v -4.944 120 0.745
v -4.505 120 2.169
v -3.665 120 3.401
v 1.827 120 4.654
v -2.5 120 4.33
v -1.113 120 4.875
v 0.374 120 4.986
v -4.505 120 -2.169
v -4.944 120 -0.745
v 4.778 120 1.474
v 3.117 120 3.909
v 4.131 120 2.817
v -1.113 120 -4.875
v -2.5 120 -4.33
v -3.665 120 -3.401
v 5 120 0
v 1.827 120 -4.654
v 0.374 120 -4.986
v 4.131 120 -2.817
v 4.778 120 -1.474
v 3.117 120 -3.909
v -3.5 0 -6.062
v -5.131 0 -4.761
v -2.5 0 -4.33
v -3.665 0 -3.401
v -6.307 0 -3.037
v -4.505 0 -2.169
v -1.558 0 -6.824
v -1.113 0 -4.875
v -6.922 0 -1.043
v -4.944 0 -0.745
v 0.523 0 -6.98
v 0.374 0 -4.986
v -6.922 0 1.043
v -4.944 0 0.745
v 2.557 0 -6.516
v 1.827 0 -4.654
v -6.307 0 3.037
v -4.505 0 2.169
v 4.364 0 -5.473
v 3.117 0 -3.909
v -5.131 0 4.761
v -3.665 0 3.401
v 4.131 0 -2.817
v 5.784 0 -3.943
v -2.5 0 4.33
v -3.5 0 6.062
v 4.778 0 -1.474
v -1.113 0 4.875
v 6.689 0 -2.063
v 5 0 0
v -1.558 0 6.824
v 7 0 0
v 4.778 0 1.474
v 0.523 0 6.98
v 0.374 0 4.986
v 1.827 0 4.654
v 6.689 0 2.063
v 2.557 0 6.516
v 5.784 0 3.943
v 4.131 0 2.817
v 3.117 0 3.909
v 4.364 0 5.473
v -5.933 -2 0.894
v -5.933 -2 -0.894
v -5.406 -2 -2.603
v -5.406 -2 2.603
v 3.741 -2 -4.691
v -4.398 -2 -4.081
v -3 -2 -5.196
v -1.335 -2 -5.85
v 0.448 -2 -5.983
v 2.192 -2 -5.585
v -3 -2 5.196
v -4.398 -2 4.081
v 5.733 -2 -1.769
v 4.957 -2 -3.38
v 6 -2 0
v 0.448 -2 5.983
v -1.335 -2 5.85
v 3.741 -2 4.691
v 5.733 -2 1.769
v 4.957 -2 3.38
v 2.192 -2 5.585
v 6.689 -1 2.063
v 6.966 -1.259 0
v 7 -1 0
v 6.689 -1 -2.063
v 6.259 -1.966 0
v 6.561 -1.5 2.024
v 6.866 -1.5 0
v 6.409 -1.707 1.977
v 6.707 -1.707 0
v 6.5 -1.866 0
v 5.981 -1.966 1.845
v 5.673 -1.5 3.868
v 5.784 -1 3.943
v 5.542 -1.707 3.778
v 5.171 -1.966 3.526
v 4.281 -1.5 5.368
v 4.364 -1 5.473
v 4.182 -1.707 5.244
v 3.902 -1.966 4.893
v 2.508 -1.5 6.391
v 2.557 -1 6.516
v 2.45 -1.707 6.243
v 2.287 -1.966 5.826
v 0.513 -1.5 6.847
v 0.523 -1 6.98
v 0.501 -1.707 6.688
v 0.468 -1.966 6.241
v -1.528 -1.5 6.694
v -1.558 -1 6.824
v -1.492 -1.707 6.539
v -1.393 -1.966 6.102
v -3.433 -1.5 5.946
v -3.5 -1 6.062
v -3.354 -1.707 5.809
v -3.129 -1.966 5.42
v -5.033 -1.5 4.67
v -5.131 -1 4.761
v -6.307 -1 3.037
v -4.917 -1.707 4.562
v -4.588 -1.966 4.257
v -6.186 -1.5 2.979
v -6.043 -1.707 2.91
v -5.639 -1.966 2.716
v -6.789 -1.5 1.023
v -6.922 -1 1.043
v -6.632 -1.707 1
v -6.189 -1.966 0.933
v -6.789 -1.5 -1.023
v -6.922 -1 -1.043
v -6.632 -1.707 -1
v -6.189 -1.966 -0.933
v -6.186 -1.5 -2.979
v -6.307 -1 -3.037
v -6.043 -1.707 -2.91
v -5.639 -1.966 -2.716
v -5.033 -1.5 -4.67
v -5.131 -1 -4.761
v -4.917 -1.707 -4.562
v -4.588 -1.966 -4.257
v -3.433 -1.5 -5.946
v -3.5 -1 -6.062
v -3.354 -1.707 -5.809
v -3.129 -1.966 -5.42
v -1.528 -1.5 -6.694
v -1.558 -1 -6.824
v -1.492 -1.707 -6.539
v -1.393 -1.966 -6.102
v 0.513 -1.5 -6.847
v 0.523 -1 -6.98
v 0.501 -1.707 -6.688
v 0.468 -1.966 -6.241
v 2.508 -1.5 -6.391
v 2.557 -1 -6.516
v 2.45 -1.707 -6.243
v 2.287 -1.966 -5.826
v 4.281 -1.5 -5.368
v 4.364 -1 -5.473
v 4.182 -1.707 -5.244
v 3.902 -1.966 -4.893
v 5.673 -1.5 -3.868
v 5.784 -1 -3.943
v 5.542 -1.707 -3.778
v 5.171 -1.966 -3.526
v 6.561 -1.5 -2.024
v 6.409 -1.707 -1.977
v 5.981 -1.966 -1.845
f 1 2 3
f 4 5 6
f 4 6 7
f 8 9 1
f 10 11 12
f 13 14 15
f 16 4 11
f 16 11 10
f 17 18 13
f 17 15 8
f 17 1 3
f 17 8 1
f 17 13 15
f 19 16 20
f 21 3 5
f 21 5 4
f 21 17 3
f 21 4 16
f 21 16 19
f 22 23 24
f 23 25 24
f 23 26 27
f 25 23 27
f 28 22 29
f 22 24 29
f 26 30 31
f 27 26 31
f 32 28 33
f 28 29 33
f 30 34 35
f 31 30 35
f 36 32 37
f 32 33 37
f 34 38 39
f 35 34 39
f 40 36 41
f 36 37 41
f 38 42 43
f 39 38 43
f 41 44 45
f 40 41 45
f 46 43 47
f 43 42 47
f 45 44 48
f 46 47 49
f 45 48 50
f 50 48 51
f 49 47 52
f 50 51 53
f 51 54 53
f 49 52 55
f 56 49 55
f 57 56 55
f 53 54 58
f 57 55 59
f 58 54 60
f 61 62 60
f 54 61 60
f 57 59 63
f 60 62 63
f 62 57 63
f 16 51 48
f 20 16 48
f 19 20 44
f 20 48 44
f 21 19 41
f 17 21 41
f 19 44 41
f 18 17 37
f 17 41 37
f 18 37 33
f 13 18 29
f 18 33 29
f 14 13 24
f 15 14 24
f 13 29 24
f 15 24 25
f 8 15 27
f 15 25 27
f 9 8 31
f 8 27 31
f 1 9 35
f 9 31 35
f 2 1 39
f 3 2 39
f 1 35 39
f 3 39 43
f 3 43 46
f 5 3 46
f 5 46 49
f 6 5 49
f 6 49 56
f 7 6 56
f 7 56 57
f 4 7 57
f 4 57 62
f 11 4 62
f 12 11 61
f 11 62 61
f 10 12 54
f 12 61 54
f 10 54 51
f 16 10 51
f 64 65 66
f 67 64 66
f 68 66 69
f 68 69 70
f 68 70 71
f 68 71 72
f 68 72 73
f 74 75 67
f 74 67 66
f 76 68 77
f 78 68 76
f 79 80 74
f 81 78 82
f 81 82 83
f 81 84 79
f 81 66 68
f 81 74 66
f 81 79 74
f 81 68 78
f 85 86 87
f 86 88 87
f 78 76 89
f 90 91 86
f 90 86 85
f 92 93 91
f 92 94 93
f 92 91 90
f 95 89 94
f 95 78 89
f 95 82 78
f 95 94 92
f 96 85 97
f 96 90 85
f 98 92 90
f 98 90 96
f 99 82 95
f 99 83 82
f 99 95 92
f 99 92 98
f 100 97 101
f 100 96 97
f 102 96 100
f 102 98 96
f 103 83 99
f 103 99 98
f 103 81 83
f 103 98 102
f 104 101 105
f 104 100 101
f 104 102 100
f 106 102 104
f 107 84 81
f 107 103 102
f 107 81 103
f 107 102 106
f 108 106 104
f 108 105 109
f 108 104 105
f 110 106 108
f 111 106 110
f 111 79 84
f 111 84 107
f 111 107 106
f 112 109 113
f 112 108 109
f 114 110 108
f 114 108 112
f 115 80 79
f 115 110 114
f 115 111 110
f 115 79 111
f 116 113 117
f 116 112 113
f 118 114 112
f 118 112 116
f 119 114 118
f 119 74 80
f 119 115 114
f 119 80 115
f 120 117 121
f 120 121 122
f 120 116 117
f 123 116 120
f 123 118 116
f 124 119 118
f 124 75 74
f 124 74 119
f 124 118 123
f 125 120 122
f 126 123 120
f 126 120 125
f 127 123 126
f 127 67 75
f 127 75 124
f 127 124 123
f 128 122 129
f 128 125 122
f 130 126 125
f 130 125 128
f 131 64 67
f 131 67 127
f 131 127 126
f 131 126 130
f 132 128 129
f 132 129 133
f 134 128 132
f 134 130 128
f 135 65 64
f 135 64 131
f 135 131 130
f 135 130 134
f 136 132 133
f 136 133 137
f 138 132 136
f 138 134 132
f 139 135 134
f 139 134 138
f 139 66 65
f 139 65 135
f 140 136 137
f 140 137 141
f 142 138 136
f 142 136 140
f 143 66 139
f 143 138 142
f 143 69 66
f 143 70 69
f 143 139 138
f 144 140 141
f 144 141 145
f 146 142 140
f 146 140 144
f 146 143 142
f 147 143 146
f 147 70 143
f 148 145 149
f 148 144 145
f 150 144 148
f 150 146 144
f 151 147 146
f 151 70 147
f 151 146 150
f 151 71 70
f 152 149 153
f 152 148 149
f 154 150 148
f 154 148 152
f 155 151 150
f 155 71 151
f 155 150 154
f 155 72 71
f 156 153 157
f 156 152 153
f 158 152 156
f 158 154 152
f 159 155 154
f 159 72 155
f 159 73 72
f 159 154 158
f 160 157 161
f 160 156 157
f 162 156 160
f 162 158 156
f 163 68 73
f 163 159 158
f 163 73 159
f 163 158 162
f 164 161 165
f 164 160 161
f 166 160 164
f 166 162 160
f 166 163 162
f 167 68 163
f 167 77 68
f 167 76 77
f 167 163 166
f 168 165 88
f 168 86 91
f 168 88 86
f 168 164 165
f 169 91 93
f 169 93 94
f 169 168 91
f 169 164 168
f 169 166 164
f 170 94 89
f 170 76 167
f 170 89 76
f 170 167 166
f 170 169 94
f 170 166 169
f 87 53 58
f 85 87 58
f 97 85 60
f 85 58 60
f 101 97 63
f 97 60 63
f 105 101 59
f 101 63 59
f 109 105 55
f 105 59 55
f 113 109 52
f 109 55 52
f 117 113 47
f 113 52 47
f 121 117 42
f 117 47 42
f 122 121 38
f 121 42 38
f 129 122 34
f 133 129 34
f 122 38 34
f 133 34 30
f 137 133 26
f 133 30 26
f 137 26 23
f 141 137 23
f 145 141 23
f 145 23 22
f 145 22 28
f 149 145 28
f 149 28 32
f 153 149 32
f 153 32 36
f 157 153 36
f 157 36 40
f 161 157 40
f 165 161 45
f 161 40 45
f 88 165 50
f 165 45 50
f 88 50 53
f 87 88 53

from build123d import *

# Parameters (mm, degrees)
SKETCH1_R           = 5
BOSS_EXTRUDE1_DEPTH = 120
SKETCH2_R           = 7
BOSS_EXTRUDE2_DEPTH = 2
FILLET1_R           = 1


with BuildPart() as part:
    # Sketch1 → Boss-Extrude1 (new body)
    with BuildSketch(Plane(origin=(0, 0, 0), x_dir=(1, 0, 0), z_dir=(0, 1, 0))):
        Circle(SKETCH1_R)
    extrude(amount=BOSS_EXTRUDE1_DEPTH)

    # Sketch2 → Boss-Extrude2 (add)
    with BuildSketch(Plane.XZ):
        Circle(SKETCH2_R)
    extrude(amount=BOSS_EXTRUDE2_DEPTH)

    # Fillet1
    fillet1_edges = [part.edges().sort_by_distance(p)[0] for p in [
        (-7, -2, 0),
    ]]
    fillet(fillet1_edges, radius=FILLET1_R)


solid = part.part
